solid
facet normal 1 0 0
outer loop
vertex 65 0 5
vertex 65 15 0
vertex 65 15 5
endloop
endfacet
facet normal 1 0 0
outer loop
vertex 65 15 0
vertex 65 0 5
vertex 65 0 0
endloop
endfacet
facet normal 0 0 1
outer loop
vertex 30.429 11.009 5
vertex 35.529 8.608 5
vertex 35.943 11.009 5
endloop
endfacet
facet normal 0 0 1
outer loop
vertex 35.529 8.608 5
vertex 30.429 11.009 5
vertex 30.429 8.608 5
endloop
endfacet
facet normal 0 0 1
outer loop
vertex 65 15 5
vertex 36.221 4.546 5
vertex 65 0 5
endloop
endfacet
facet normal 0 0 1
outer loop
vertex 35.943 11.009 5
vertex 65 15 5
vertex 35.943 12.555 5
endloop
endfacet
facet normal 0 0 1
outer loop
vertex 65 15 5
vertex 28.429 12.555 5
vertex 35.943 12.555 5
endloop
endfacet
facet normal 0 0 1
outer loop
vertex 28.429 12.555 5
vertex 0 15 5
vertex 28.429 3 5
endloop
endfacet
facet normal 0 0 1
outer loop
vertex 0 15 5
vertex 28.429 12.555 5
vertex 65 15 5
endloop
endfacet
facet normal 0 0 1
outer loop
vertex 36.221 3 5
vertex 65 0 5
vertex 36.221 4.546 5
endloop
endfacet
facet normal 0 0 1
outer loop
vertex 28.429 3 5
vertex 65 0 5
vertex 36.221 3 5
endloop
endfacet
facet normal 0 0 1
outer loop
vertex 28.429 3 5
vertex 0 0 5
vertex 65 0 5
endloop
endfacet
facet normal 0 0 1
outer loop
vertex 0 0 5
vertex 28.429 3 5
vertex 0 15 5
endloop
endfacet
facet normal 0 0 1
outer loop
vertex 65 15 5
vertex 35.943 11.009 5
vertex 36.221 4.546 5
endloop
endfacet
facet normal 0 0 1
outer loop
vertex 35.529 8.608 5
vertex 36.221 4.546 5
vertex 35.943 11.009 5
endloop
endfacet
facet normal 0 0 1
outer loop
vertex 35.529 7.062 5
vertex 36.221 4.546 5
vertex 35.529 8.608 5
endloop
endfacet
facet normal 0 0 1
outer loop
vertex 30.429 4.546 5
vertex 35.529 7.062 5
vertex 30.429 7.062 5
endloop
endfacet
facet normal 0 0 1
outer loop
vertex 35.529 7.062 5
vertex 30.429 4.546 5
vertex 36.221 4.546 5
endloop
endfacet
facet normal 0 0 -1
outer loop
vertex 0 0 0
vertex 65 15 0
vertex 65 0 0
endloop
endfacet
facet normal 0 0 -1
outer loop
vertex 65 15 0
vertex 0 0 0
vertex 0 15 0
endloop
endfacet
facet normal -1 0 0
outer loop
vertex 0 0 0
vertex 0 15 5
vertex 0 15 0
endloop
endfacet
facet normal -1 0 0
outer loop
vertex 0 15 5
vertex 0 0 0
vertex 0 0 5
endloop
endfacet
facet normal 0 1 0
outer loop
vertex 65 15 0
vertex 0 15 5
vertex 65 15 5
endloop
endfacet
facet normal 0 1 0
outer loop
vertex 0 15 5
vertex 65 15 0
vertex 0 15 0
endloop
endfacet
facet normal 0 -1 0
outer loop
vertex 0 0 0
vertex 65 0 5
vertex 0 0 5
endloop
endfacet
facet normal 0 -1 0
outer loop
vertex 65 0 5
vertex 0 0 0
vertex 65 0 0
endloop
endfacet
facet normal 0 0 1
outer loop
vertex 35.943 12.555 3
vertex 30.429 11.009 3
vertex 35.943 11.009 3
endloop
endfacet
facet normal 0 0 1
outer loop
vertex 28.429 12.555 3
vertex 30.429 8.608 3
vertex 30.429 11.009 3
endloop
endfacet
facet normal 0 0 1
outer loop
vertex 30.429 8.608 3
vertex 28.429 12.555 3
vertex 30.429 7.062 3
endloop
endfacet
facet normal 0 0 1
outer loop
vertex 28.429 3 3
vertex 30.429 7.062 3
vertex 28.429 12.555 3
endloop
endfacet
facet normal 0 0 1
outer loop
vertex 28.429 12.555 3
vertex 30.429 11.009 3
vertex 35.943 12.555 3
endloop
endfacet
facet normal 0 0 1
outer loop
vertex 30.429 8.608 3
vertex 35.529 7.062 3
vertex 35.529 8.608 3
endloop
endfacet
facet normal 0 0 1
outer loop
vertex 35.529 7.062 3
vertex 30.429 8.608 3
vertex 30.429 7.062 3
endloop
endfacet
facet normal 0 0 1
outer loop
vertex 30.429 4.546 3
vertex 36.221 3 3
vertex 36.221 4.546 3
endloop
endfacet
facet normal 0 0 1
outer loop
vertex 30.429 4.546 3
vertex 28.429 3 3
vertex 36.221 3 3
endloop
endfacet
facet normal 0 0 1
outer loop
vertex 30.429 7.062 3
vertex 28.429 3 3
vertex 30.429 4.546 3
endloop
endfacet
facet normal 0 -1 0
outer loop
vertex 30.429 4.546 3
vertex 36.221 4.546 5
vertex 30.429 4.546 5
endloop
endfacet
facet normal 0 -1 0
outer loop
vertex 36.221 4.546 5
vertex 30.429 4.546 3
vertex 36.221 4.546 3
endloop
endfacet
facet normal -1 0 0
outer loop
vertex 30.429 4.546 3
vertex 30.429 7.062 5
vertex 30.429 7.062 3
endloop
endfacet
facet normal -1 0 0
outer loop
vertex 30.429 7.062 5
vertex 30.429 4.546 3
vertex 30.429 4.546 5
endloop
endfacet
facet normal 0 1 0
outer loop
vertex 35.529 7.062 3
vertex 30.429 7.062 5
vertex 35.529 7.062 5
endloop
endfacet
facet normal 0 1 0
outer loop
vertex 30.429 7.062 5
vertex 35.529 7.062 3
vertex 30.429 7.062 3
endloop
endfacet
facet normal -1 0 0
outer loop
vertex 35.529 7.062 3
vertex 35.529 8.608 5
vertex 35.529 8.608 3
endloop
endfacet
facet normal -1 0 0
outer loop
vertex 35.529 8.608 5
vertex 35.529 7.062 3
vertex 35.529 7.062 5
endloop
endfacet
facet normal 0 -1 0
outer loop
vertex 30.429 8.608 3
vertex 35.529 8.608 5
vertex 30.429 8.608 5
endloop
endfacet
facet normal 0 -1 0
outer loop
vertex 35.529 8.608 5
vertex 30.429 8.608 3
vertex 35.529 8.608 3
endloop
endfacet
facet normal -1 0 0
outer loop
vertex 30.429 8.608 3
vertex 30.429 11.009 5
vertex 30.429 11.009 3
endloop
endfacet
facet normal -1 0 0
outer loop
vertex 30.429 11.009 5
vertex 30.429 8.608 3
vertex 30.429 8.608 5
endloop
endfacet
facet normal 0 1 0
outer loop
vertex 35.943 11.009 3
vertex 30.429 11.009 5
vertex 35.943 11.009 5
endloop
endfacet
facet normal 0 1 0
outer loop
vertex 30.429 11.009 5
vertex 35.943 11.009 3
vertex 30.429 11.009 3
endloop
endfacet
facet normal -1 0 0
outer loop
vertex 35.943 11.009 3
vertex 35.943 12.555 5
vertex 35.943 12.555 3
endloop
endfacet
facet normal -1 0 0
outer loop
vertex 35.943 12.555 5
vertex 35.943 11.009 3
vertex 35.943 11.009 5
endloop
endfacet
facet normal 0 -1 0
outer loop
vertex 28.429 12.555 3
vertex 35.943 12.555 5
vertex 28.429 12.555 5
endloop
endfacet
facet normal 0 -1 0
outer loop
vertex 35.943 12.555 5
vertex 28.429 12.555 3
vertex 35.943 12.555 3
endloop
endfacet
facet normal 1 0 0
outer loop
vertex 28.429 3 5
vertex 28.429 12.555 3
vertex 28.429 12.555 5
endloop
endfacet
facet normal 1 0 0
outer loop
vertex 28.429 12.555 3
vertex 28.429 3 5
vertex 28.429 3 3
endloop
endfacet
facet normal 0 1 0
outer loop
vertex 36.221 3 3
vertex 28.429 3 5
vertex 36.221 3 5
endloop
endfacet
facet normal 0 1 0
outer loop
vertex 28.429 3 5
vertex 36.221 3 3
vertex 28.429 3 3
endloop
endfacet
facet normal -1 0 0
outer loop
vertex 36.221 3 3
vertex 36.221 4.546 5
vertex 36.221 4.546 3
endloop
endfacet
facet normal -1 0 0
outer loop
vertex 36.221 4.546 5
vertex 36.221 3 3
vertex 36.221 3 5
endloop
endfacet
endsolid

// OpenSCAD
difference(){
	union(){ 
        translate([0,0,0]){
           cube([65,15,5], center=false);
        }                
	}
	union() {
        translate([60-65/2, 3,3]){
            linear_extrude(height = 10) {
                text("E", size = 10, font="Arial:style=Bold");
            }
        }                


	}
}
